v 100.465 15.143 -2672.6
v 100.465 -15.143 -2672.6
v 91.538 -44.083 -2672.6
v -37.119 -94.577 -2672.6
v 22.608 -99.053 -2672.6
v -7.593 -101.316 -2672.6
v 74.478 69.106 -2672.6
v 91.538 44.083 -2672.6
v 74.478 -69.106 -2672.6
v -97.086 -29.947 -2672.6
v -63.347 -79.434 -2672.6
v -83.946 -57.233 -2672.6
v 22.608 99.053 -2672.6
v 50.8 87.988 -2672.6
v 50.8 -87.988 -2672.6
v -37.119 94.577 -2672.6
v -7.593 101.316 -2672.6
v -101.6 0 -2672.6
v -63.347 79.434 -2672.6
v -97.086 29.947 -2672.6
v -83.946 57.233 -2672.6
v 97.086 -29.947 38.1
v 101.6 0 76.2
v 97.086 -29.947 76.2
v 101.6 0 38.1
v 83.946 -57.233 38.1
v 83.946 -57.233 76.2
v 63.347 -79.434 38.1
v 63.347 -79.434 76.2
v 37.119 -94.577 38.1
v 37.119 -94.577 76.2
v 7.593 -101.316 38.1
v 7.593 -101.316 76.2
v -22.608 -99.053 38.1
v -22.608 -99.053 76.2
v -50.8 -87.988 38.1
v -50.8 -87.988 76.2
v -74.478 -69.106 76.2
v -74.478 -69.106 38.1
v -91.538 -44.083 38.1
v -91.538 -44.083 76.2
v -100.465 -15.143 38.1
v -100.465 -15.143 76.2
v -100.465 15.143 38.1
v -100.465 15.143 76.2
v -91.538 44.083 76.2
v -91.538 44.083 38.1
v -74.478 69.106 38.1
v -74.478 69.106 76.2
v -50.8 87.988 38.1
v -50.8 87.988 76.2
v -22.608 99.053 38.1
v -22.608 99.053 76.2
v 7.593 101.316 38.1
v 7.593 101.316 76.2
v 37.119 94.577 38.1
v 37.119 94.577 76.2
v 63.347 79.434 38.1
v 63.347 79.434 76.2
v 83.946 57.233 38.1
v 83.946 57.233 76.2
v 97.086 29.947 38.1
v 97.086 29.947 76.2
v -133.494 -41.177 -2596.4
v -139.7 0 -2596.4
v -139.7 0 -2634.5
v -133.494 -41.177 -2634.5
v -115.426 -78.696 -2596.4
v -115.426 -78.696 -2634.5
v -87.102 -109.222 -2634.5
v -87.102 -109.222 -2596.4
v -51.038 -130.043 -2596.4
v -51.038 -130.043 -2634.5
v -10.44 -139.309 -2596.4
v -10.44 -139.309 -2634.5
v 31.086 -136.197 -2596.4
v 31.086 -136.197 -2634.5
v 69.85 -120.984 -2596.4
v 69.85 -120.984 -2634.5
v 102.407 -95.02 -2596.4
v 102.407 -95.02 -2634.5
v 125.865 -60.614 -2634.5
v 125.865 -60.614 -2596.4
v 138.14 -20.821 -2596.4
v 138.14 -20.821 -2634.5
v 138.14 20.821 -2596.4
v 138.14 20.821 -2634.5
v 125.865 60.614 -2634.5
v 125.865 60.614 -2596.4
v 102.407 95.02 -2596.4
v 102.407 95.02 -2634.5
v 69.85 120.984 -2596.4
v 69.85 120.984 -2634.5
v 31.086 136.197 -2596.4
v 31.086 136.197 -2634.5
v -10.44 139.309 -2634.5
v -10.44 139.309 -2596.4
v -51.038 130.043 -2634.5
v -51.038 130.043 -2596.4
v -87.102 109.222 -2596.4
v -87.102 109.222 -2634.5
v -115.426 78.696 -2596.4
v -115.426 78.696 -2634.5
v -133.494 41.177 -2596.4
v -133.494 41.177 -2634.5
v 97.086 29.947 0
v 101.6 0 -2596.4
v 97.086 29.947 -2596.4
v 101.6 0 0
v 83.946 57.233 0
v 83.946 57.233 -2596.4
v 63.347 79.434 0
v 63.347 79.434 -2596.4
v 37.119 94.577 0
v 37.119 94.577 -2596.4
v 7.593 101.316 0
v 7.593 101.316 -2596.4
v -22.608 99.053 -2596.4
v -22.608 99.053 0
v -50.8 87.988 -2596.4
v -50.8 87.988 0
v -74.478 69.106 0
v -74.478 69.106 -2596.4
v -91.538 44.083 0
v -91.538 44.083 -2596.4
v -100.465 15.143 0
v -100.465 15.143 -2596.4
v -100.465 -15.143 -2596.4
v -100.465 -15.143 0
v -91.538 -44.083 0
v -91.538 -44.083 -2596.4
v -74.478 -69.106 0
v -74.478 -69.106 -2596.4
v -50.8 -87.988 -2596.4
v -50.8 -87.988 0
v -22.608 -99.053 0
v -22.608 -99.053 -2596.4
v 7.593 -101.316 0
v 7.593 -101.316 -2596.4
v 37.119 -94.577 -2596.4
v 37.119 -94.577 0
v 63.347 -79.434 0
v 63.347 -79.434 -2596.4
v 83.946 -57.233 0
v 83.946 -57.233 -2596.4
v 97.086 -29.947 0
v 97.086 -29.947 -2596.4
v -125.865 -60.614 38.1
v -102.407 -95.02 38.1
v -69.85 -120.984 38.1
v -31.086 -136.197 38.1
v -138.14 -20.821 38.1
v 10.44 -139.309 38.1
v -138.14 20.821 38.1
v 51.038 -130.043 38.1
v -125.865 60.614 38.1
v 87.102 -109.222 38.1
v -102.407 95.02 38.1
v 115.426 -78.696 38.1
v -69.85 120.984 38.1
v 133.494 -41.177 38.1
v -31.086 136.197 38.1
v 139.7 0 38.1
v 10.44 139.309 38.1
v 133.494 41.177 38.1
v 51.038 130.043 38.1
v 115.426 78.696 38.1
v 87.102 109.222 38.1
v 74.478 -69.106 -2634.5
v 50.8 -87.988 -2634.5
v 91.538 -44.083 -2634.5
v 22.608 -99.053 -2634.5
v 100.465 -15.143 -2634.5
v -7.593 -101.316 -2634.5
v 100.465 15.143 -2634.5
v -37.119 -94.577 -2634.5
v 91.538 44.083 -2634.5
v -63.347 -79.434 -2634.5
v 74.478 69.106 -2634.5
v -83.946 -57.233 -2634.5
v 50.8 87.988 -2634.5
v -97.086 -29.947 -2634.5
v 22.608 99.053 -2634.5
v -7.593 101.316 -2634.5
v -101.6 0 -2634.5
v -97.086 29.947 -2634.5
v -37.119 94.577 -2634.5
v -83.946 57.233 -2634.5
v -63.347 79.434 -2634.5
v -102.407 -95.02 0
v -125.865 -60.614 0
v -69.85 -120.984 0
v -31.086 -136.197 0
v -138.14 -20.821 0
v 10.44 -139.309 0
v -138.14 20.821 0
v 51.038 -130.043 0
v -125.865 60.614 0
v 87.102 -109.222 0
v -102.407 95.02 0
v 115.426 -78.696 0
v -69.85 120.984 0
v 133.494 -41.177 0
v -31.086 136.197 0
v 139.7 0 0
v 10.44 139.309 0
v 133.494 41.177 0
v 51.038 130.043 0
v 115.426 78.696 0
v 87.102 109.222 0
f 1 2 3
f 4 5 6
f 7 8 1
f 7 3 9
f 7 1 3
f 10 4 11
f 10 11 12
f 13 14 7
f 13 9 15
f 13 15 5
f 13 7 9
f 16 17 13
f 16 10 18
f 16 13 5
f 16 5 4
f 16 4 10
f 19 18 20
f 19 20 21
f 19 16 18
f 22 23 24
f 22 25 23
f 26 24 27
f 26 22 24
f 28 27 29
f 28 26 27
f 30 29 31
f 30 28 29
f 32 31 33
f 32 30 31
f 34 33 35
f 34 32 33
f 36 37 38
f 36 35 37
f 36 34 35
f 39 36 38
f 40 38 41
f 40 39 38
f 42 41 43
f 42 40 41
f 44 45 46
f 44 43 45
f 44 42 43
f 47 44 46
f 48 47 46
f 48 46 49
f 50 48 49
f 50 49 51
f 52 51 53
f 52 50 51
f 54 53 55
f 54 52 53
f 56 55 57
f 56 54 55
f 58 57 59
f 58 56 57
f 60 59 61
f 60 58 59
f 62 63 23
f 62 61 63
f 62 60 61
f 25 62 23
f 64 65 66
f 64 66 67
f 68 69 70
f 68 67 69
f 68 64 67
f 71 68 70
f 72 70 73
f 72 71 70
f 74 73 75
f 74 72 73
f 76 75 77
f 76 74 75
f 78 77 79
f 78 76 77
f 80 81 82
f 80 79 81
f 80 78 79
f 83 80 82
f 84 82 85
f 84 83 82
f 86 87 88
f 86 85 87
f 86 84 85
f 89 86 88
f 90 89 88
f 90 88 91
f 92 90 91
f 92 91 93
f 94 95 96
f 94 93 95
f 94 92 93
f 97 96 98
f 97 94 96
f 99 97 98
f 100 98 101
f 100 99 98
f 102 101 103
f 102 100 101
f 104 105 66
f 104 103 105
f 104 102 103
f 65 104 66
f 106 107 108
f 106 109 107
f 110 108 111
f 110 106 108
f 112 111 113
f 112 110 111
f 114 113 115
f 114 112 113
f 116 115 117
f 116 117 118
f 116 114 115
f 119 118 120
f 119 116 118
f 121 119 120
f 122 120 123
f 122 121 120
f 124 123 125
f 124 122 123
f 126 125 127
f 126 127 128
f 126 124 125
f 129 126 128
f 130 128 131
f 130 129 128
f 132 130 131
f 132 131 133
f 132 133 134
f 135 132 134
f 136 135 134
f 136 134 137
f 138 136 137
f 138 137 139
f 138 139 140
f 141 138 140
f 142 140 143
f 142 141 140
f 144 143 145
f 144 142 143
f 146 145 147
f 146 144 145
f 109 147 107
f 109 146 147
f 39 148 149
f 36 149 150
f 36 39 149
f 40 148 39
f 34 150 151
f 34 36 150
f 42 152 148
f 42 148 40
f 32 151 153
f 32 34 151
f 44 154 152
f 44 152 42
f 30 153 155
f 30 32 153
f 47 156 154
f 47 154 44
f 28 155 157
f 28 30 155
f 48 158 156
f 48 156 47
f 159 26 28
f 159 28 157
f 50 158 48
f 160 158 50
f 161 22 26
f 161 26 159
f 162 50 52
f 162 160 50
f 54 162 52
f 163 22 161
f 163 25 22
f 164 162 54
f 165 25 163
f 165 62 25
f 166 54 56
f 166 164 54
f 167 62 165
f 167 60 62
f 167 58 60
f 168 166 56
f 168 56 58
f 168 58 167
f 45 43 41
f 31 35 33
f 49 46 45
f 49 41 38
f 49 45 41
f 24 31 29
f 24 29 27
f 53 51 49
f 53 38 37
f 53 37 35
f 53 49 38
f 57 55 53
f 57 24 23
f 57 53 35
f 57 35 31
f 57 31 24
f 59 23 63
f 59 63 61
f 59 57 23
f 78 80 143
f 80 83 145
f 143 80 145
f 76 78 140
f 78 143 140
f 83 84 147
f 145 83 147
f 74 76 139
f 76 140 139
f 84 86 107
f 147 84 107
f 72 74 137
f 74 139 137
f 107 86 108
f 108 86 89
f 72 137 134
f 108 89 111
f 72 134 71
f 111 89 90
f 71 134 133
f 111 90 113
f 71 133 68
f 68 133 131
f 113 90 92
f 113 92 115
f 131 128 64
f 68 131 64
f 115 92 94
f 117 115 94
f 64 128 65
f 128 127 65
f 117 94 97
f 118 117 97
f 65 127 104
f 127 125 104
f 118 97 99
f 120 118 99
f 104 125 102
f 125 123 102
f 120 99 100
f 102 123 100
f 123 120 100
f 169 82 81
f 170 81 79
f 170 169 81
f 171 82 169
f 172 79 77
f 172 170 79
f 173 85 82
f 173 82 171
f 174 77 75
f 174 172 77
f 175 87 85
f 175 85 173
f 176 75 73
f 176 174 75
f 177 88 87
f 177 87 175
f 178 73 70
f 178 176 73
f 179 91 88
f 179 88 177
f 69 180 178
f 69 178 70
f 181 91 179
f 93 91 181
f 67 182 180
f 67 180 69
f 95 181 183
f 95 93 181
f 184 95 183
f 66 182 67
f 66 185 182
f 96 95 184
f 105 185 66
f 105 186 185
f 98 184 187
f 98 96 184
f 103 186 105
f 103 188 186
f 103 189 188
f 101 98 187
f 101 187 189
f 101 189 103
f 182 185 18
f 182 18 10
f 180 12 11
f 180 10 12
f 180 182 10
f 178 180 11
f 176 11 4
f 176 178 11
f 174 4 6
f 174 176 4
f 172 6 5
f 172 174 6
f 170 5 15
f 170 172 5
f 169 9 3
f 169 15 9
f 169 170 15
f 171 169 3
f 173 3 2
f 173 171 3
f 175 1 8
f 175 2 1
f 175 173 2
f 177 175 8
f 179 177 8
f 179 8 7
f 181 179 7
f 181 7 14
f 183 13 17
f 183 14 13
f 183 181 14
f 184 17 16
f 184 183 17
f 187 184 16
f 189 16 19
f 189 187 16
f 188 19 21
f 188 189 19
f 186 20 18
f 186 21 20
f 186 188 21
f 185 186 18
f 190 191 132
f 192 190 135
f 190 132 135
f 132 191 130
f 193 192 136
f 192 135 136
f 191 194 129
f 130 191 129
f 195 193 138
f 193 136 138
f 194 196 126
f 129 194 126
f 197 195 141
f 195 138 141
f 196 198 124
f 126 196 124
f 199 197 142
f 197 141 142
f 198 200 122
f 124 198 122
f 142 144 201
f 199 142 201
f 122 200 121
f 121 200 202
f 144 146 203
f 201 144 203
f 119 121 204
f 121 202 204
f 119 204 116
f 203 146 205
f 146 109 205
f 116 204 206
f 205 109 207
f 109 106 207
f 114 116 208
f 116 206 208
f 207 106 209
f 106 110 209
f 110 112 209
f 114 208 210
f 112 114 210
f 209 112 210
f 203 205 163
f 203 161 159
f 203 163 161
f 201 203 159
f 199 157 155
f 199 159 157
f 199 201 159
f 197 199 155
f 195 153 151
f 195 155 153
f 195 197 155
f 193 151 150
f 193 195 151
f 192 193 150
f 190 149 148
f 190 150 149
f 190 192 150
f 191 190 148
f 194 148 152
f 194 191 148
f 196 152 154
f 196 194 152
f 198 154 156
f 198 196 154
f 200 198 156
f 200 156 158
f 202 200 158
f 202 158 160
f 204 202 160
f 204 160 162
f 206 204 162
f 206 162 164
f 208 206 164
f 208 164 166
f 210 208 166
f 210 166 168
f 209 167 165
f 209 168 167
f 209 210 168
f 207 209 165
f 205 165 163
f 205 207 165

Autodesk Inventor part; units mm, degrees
ref_plane "YZ Plane" through (0, 0, 0) normal (1, 0, 0) x (0, 1, 0)
ref_plane "XZ Plane" through (0, 0, 0) normal (0, 1, 0) x (-1, 0, 0)
ref_plane "XY Plane" through (0, 0, 0) normal (0, 0, 1) x (1, 0, 0)
sketch "Sketch1" plane through (0, 0, 0) normal (0, 0, 1) x (1, 0, 0)
  circle A0 centre (0, 0) radius 101.6
  dimension "d0" = 203.2
extrude "Extrusion1" add sketch "Sketch1" against normal blind 2596.4
sketch "Sketch2" plane through (0, 0, 0) normal (0, 0, 1) x (1, 0, 0)
  circle A0 centre (0, 0) radius 139.7
  dimension "d3" = 279.4
extrude "Extrusion2" add sketch "Sketch2" along normal blind 38.1
sketch "Sketch3" plane through (0, 0, -2596.4) normal (0, 0, -1) x (-1, 0, 0)
  circle A0 centre (0, 0) radius 139.7 projected
extrude "Extrusion3" add sketch "Sketch3" along normal blind 38.1
sketch "Sketch4" plane through (0, 0, 38.1) normal (0, 0, 1) x (1, 0, 0)
  circle A0 centre (0, 0) radius 101.6 projected
extrude "Extrusion4" add sketch "Sketch4" along normal blind 38.1
sketch "Sketch5" plane through (0, 0, -2634.5) normal (0, 0, -1) x (-1, 0, 0)
  circle A0 centre (0, 0) radius 101.6 projected
extrude "Extrusion5" add sketch "Sketch5" along normal blind 38.1
properties part number "dry_pipe_new"
